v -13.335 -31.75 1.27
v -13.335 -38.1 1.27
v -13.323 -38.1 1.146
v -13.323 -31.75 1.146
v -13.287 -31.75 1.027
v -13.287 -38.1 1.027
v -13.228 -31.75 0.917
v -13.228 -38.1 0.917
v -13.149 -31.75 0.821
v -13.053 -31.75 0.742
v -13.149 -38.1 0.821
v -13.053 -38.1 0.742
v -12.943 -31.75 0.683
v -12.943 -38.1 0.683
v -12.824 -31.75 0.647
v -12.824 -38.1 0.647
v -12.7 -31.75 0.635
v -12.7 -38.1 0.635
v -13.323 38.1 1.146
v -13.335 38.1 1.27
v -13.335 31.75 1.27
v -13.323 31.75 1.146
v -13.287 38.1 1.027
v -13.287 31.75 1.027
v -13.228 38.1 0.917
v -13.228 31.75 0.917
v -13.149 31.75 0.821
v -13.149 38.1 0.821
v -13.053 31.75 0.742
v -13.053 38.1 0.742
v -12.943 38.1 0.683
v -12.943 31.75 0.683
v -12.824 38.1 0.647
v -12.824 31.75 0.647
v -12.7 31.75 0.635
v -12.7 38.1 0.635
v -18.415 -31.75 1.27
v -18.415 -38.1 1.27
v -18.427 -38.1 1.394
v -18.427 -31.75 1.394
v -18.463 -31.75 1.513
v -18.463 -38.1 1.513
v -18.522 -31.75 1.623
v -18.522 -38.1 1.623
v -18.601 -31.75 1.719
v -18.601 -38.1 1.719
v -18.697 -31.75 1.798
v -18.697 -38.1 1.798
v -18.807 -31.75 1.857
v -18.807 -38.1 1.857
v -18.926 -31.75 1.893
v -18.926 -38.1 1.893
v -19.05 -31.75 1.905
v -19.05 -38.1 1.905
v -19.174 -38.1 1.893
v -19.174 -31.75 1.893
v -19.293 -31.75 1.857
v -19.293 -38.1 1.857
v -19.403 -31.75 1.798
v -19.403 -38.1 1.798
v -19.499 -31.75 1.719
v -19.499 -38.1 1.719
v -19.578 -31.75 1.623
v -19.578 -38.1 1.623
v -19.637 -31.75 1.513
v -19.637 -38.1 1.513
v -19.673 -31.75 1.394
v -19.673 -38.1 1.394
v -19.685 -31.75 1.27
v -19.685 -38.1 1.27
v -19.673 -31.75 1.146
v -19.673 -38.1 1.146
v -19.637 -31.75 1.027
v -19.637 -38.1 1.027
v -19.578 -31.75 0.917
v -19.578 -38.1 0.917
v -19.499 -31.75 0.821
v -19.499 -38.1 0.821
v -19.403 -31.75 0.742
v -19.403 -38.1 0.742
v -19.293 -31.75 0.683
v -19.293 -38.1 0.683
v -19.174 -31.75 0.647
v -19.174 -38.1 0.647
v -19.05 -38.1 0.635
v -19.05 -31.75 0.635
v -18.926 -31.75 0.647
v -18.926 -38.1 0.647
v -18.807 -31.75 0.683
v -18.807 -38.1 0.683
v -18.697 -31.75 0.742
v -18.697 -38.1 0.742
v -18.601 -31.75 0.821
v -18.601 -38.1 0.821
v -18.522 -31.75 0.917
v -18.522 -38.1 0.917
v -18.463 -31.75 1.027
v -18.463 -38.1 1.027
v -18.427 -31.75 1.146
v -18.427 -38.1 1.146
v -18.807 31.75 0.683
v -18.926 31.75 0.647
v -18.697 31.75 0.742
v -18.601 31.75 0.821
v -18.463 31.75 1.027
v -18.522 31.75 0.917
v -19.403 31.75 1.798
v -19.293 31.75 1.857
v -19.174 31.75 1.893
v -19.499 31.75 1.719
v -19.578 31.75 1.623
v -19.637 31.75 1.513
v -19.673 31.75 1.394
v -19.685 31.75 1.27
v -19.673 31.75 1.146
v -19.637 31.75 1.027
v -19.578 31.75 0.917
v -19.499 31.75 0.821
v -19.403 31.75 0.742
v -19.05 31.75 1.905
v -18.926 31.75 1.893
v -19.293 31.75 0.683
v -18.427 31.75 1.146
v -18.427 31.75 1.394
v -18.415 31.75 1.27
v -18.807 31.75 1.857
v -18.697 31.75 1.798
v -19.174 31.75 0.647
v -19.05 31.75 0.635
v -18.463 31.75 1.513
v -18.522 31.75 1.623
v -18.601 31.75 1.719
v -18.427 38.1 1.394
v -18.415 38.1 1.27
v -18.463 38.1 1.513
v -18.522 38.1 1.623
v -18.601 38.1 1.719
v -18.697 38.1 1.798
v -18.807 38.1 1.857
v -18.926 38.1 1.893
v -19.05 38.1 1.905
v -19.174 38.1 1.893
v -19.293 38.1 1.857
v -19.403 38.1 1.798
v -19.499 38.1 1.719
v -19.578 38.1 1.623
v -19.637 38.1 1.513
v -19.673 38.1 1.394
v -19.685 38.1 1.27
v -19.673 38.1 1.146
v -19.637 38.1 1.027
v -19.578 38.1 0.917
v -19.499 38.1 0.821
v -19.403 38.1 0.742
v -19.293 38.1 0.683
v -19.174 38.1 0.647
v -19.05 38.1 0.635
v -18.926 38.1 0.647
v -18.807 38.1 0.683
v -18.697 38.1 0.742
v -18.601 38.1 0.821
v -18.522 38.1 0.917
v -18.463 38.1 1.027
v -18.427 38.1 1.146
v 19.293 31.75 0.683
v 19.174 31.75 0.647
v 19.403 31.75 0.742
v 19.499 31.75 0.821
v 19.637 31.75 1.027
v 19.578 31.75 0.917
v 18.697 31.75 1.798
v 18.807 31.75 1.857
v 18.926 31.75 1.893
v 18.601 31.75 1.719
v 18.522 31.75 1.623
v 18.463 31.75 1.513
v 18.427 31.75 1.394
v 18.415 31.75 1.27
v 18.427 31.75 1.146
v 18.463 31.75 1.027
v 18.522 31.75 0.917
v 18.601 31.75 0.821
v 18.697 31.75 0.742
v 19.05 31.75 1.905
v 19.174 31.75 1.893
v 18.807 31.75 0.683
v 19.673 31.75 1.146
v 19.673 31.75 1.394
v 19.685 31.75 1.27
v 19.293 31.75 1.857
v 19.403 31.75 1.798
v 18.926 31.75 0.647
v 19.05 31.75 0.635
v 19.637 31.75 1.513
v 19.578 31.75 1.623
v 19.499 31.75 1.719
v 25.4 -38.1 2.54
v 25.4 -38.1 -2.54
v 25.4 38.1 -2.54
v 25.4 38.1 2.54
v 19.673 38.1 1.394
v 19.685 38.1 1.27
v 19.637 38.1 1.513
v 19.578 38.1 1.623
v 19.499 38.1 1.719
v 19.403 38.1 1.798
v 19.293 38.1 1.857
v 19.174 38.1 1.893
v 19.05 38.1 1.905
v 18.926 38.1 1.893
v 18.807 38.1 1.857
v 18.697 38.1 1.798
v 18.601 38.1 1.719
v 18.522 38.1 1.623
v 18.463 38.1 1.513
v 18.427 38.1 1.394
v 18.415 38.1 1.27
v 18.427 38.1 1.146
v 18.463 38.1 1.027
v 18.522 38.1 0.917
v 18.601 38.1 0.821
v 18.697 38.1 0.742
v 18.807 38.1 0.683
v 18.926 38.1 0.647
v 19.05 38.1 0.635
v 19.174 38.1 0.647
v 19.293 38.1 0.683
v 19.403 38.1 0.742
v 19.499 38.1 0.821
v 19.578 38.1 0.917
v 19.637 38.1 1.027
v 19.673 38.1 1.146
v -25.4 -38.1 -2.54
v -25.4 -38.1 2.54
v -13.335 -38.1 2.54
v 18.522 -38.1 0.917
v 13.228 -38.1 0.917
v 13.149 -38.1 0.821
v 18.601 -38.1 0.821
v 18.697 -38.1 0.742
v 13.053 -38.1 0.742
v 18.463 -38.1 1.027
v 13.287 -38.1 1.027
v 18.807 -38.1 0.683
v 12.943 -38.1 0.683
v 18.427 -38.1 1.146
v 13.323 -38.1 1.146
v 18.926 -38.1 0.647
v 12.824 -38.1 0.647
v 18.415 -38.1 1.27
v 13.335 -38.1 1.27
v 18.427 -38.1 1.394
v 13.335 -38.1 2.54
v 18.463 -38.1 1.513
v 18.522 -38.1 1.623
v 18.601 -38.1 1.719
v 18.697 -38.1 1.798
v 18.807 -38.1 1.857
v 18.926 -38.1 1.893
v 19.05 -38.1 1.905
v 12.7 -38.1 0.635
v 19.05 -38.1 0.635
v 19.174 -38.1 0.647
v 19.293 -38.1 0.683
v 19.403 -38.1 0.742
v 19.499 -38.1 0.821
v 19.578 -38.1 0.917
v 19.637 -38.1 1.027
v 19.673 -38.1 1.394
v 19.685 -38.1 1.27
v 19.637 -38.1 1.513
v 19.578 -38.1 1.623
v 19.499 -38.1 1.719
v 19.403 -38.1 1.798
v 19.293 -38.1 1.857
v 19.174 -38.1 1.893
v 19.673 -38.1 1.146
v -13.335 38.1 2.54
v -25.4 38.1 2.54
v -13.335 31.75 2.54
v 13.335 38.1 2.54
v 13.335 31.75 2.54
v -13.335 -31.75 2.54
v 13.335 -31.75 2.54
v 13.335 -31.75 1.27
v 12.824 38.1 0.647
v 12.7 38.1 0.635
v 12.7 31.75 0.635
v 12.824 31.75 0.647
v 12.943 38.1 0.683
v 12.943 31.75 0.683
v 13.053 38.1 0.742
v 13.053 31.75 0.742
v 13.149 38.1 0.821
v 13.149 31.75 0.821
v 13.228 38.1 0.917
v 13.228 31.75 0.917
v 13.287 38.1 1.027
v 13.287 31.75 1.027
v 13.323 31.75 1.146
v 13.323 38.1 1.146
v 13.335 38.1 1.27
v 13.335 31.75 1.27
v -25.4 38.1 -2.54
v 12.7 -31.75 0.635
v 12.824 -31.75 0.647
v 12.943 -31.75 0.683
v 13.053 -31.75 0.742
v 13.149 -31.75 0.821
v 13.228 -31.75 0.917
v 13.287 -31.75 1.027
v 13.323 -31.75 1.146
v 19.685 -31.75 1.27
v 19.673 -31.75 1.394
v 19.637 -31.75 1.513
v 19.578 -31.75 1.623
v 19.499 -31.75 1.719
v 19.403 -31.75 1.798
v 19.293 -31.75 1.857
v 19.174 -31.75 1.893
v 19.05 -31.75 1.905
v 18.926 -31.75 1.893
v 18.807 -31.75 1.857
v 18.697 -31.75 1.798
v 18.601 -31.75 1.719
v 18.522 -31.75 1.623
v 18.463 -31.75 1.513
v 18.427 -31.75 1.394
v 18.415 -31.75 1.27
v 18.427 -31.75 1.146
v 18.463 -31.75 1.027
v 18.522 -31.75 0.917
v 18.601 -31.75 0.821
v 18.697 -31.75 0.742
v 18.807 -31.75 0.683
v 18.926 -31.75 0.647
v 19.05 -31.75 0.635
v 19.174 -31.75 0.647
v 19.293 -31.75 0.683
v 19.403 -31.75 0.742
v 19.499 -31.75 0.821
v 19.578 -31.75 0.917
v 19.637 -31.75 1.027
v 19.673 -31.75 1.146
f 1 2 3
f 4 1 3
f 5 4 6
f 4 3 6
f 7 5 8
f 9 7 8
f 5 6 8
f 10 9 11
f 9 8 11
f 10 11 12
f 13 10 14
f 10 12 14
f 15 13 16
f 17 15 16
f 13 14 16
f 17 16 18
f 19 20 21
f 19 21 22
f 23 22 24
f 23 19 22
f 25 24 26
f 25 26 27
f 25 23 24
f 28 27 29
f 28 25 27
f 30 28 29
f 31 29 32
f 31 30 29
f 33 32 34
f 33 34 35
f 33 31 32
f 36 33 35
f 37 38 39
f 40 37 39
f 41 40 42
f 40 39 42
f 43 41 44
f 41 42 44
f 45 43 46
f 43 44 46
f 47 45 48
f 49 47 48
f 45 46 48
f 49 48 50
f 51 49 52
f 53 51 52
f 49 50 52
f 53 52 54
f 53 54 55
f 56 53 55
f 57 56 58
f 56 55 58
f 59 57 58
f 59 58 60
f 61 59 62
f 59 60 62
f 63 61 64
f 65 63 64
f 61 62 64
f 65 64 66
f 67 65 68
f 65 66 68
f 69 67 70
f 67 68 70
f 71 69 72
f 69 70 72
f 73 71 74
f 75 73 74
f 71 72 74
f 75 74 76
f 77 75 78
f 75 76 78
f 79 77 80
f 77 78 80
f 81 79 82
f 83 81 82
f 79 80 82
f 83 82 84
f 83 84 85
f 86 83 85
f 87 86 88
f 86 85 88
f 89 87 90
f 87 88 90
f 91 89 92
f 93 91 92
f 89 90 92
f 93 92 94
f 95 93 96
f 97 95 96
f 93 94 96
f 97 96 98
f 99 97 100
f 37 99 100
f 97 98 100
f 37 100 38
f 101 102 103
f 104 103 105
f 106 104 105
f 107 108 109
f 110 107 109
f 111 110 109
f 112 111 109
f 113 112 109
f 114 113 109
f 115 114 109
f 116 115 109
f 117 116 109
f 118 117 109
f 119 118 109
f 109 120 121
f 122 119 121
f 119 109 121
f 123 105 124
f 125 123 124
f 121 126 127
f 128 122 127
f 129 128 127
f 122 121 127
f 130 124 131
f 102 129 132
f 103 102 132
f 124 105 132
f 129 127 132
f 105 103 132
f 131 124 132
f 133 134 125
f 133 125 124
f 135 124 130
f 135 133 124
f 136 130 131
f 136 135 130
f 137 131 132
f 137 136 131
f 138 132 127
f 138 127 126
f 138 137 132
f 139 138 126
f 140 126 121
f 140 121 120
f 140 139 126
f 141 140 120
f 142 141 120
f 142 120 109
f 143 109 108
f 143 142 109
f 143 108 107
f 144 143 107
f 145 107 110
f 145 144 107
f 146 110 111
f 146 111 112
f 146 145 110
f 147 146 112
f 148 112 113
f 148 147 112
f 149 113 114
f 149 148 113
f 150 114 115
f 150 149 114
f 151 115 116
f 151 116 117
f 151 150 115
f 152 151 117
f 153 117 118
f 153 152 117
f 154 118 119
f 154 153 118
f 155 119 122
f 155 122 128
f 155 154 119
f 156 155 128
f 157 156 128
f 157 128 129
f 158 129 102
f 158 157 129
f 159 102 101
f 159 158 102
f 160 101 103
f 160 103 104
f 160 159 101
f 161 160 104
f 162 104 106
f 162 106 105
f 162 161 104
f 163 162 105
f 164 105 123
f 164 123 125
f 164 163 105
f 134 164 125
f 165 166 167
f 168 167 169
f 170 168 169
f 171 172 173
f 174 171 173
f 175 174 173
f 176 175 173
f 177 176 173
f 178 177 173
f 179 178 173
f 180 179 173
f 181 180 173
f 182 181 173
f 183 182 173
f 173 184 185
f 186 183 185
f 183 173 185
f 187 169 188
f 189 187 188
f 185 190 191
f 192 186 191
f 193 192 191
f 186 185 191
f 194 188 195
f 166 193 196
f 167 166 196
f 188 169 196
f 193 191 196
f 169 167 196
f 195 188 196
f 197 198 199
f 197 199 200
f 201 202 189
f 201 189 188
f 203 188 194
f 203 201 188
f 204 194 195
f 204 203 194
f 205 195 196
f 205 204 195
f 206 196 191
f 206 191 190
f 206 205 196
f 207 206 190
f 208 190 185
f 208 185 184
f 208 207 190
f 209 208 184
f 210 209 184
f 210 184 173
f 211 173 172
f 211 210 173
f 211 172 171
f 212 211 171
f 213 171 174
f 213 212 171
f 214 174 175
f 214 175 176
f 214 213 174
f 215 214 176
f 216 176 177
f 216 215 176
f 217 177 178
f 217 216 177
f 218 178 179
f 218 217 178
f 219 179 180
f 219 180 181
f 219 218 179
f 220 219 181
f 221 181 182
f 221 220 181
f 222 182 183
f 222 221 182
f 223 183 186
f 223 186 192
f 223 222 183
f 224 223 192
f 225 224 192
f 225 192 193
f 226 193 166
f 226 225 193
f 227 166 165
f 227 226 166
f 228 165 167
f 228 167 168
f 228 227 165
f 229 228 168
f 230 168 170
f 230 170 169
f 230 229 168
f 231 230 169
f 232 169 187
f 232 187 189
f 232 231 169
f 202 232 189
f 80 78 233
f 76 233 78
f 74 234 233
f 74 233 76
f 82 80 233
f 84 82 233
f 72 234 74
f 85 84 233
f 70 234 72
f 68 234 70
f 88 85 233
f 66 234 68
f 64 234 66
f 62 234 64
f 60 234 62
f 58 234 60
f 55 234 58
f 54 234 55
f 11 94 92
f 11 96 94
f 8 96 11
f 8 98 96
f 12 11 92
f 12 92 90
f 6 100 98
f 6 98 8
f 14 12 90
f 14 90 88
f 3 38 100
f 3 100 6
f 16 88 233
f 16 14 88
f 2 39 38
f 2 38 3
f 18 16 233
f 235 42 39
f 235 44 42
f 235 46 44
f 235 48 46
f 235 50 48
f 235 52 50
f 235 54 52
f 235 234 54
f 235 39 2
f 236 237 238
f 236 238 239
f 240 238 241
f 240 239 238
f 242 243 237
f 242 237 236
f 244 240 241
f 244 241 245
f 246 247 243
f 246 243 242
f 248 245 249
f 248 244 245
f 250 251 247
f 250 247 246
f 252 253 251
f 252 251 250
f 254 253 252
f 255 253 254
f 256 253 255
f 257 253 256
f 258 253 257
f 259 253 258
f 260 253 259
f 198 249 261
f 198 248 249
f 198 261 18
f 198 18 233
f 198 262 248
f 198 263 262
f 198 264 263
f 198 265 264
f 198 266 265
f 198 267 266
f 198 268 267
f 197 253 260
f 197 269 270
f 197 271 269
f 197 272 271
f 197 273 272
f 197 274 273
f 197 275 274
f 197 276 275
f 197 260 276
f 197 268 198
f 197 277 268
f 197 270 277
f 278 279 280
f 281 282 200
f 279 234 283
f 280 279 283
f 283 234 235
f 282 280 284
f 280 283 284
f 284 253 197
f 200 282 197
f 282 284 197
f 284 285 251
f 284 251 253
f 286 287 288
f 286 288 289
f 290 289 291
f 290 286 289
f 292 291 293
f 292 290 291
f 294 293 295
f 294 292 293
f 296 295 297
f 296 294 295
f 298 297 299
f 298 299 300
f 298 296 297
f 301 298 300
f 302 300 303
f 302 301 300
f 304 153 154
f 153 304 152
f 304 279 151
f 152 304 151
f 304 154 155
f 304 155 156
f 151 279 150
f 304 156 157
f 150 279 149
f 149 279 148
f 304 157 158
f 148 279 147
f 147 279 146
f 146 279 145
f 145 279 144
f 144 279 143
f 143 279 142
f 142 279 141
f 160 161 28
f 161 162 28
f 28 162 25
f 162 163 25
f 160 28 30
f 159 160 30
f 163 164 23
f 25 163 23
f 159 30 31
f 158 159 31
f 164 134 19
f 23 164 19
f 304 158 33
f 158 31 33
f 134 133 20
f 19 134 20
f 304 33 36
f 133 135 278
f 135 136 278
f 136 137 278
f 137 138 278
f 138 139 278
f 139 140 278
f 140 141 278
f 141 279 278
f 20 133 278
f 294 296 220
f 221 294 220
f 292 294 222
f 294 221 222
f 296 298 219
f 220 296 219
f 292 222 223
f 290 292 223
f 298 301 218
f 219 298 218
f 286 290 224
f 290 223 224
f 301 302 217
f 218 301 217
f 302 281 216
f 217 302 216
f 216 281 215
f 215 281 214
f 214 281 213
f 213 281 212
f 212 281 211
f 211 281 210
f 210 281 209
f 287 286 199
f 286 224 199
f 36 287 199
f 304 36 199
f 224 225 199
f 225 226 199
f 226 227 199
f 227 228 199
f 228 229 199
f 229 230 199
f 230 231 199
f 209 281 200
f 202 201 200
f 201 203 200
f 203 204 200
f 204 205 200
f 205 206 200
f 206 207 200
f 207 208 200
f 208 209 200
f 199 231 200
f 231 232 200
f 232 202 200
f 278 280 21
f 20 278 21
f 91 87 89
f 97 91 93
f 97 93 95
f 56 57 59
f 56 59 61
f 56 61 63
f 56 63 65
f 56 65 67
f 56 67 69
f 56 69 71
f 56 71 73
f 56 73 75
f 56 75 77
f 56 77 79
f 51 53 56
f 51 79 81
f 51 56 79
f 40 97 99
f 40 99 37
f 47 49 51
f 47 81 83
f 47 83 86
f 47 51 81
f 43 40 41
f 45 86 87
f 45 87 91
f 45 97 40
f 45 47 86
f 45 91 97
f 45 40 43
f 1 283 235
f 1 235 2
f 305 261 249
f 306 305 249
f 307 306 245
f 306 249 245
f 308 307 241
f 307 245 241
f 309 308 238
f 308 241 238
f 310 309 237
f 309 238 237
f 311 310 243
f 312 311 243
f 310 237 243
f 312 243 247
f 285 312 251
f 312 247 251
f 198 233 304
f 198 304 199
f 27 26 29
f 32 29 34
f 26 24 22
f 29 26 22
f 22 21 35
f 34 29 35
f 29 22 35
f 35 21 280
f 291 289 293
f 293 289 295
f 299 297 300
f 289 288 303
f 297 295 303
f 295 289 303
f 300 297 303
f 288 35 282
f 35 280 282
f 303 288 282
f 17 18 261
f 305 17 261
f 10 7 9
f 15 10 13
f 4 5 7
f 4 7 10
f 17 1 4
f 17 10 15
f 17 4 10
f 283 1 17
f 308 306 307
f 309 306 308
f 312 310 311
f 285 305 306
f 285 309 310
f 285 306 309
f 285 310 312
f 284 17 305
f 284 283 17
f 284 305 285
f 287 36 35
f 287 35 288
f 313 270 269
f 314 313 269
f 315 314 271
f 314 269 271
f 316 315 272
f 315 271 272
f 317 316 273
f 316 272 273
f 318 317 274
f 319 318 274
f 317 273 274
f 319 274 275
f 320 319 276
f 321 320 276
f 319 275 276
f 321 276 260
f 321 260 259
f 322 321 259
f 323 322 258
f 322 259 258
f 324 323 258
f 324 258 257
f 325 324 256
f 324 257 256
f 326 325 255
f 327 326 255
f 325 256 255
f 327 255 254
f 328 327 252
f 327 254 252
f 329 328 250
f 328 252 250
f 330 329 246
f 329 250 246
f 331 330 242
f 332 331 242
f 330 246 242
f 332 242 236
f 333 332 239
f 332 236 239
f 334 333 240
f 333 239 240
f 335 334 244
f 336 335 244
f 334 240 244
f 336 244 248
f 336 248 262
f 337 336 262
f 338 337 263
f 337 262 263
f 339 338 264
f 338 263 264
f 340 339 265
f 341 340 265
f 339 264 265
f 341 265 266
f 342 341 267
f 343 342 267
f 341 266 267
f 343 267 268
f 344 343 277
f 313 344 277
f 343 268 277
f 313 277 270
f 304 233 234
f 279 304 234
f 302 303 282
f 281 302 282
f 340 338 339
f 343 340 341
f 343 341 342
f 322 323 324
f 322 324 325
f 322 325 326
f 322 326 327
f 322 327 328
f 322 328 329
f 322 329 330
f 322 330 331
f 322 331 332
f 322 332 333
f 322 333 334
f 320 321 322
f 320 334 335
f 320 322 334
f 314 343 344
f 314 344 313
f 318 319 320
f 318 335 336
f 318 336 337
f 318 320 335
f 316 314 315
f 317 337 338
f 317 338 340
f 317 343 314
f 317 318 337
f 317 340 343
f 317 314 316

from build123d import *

# Parameters (mm, degrees)
F0_W     = 50.8
F0_H     = 5.08
F1_DEPTH = 38.1
F2_R     = 0.635
F3_DEPTH = 6.35


# Not quite as in the source:
# - a pattern or mirror of a feature is missing from the dataset's text; its kind, count and spacing are read off the source's solid


with BuildPart() as f1:
    # F0 (on Front) → F1 (new body, symmetric)
    with BuildSketch(Plane.XZ):
        Rectangle(F0_W, F0_H)
    extrude(amount=F1_DEPTH, both=True)

    # F2 (on face) → F3 (cut)
    with BuildSketch(Plane.XZ.offset(38.1)):
        with Locations((-19.05, 1.27)):
            Circle(F2_R)
        with BuildLine():
            ThreePointArc((-13.335, 1.27), (-13.1490128061, 0.8209871939), (-12.7, 0.635))
            Line((-12.7, 0.635), (0, 0.635))
            Line((0, 0.635), (12.7, 0.635))
            ThreePointArc((12.7, 0.635), (13.1490128061, 0.8209871939), (13.335, 1.27))
            Line((13.335, 1.27), (13.335, 2.54))
            Line((13.335, 2.54), (-13.335, 2.54))
            Line((-13.335, 2.54), (-13.335, 1.27))
        make_face()
        with Locations((19.05, 1.27)):
            Circle(F2_R)
    f3 = extrude(amount=-F3_DEPTH, mode=Mode.SUBTRACT)

    # F3_copies: F3 across plane
    add(f3.mirror(Plane.ZX), mode=Mode.SUBTRACT)


solid = f1.part
